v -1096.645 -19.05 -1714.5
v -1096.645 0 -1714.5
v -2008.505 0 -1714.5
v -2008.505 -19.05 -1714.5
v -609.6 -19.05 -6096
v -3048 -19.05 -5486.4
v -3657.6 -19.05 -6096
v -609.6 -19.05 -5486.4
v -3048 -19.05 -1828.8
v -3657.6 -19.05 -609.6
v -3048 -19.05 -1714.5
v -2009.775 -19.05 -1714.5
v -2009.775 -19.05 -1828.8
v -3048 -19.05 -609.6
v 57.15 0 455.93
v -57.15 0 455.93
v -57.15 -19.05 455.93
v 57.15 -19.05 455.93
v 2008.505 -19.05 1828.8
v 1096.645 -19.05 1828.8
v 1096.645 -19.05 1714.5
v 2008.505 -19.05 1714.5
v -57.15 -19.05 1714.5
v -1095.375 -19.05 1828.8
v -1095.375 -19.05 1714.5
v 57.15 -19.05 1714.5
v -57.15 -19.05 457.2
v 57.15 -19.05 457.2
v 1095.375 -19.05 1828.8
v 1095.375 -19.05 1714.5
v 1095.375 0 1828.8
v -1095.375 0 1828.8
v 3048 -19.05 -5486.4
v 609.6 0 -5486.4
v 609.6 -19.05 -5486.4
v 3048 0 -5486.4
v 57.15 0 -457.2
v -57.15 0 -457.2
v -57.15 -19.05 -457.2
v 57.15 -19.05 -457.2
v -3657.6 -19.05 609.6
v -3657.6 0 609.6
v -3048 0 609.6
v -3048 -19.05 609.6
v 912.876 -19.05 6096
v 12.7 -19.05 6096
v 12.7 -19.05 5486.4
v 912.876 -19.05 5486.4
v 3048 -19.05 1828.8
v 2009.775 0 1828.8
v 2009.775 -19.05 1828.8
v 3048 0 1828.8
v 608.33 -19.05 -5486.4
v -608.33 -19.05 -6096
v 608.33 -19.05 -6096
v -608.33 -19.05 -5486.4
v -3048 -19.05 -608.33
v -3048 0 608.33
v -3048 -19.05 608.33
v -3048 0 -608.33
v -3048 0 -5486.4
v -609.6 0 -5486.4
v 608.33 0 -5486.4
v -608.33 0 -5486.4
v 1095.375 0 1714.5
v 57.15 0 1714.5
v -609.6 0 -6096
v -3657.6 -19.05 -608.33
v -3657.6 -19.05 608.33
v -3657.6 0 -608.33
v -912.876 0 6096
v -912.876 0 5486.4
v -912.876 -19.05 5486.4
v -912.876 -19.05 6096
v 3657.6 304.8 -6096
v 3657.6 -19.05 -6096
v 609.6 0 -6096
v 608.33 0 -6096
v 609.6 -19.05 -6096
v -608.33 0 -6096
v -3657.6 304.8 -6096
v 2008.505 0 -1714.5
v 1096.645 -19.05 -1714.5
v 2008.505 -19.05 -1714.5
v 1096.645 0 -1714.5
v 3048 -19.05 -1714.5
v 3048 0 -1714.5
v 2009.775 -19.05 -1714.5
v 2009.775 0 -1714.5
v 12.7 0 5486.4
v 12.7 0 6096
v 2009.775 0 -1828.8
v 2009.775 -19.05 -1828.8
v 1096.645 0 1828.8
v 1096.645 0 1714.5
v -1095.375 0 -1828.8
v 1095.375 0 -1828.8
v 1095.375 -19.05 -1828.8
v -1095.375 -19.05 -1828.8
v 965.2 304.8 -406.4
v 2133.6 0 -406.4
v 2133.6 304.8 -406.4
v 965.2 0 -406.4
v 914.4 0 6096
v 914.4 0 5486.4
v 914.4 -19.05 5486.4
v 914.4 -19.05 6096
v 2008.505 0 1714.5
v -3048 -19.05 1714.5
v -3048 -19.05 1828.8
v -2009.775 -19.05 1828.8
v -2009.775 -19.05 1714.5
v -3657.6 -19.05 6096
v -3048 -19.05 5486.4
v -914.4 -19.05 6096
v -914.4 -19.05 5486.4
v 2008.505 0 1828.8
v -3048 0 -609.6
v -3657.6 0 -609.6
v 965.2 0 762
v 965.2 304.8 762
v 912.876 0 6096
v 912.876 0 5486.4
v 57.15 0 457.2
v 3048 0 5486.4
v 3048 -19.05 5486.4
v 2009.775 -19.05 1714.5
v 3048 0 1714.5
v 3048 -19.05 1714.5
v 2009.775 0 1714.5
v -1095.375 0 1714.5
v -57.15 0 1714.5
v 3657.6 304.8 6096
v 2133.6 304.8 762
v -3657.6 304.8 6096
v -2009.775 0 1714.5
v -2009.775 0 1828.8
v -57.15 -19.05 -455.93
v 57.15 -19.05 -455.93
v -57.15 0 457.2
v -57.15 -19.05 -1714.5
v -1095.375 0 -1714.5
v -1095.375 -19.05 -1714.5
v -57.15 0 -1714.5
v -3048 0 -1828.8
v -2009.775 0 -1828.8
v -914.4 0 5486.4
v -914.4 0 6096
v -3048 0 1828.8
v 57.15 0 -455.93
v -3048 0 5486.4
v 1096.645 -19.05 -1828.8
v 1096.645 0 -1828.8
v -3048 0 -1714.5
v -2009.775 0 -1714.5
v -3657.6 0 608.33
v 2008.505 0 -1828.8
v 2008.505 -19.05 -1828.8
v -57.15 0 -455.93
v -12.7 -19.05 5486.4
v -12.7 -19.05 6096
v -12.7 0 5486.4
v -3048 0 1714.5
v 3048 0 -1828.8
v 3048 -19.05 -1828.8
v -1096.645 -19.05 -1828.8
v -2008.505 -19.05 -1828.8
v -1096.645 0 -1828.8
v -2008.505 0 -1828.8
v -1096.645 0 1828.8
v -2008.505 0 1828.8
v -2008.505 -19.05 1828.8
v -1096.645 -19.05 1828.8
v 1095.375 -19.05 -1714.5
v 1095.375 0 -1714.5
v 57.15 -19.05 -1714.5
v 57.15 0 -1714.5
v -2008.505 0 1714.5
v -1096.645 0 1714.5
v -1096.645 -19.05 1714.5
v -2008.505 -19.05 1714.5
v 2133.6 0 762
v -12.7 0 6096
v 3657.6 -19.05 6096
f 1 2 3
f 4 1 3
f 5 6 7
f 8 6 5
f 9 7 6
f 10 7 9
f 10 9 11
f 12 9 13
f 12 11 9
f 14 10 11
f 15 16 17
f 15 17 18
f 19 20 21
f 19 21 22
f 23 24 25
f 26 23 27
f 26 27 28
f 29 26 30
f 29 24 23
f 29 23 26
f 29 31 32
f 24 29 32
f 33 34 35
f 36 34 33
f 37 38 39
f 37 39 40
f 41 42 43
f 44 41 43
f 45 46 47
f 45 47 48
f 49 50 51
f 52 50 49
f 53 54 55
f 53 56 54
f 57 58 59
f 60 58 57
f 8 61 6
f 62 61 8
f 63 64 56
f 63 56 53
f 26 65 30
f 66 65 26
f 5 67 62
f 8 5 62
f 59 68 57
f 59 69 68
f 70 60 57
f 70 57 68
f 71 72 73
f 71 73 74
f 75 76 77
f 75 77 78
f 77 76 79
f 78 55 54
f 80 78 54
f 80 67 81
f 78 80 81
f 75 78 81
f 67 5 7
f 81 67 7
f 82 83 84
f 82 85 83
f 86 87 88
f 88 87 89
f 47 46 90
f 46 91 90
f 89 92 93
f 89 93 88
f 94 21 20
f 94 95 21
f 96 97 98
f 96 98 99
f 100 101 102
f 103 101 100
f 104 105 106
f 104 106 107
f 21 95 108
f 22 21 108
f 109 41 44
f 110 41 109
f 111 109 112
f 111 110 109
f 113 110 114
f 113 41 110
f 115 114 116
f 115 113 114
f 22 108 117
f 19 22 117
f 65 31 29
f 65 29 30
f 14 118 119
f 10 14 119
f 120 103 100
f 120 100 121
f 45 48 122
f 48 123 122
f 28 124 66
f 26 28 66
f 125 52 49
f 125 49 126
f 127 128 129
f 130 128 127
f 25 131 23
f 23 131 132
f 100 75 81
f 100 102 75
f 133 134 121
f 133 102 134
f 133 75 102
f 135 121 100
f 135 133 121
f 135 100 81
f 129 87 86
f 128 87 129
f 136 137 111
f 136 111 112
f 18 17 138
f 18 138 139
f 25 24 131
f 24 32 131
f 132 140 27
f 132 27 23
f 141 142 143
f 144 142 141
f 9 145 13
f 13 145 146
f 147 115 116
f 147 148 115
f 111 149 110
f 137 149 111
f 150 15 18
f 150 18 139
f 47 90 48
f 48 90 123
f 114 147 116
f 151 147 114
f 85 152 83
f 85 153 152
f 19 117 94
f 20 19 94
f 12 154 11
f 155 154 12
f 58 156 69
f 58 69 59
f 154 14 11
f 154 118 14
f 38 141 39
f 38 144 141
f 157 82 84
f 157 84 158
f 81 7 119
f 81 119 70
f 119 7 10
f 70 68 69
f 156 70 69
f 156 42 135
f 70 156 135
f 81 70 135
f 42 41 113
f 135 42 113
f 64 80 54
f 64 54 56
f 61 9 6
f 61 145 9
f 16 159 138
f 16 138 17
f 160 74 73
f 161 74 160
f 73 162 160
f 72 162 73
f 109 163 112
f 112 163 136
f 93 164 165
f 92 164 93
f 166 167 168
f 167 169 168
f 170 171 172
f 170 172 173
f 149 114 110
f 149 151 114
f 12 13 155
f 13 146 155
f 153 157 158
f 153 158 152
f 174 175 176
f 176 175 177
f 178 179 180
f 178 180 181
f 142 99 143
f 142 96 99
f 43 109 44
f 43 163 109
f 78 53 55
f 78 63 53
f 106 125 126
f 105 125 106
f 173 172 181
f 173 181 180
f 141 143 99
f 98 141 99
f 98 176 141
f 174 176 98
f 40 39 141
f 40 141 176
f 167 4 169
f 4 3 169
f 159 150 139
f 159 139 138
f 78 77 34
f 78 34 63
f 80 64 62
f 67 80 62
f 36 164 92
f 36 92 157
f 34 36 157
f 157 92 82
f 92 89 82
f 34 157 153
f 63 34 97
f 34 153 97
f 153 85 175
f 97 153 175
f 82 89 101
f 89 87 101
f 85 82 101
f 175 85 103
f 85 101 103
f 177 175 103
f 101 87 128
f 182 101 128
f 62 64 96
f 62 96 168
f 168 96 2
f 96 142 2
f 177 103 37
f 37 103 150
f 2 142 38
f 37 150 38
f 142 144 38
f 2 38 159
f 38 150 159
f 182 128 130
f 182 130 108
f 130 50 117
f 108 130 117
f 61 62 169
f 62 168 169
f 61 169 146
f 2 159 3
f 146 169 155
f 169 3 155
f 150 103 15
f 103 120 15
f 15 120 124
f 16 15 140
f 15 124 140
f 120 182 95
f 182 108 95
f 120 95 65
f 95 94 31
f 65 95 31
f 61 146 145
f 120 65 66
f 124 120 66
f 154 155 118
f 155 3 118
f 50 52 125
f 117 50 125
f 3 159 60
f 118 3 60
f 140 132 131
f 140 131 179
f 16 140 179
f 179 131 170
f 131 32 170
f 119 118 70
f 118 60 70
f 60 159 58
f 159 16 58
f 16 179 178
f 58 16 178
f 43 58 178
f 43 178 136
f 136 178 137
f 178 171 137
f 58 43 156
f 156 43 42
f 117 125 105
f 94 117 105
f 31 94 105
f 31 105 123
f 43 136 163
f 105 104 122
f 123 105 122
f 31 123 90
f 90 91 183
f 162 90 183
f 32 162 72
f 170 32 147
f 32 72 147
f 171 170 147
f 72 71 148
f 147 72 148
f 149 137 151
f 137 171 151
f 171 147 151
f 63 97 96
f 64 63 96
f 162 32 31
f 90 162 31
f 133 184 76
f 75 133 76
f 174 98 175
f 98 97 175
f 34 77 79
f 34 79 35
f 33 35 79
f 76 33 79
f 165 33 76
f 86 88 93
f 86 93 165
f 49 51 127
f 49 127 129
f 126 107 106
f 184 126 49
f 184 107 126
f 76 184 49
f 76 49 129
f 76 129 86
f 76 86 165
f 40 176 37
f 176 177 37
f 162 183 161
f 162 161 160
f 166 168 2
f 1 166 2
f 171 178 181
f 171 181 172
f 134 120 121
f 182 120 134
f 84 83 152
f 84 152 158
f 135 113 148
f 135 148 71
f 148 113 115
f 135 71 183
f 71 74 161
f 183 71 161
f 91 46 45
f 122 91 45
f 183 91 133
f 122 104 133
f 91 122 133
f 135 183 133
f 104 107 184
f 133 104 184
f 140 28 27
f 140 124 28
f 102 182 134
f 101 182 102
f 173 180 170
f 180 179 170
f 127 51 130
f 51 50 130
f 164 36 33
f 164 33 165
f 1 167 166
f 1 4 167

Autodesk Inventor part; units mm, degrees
ref_plane "YZ Plane" through (0, 0, 0) normal (1, 0, 0) x (0, 1, 0)
ref_plane "XZ Plane" through (0, 0, 0) normal (0, 1, 0) x (-1, 0, 0)
ref_plane "XY Plane" through (0, 0, 0) normal (0, 0, 1) x (1, 0, 0)
sketch "Sketch1" plane through (0, 0, 0) normal (0, 1, 0) x (-1, 0, 0)
  line L0 (3657.6, -6096) -> (3657.6, 6096)
  line L1 (-3657.6, 6096) -> (-3657.6, -6096)
  line L2 (-3657.6, -6096) -> (-609.6, -6096)
  line L3 (609.6, -6096) -> (3657.6, -6096)
  line L4 (3657.6, 6096) -> (914.4, 6096)
  line L5 (-914.4, 6096) -> (-3657.6, 6096)
  line L6 (0, -8534.4) -> (0, 8534.4) projected
  line L7 (-5120.64, 0) -> (5120.64, 0) projected
  line L8 (-3657.6, -6096) -> (3657.6, -6096)
  line L9 (3657.6, -6096) -> (3657.6, 6096)
  line L10 (3657.6, 6096) -> (-3657.6, 6096)
  line L11 (-3657.6, 6096) -> (-3657.6, -6096)
  line L12 (-2133.6, -406.4) -> (-965.2, -406.4)
  line L13 (-965.2, -406.4) -> (-965.2, 762)
  line L14 (-965.2, 762) -> (-2133.6, 762)
  line L15 (-2133.6, 762) -> (-2133.6, -406.4)
  dimension "d0" = 7315.2
  dimension "d12" = 12192
  dimension "d16" = 1168.4
  dimension "d17" = 1168.4
  dimension "d18" = 1524
  dimension "d19" = 5689.6
extrude "Extrusion1" add sketch "Sketch1" along normal blind 304.8 contours L3 L8 L6 L7 L0 | L7 L6 L10 L4 L0 | L7 L13 L14 L15 L1 L5 L10 L6 | L6 L8 L2 L1 L7 L15 L12 L13
sketch "Sketch2" plane through (0, 0, 0) normal (0, -1, 0) x (1, 0, 0)
  line L0 (3657.6, -6096) -> (3657.6, 6096)
  line L1 (-3657.6, 6096) -> (-3657.6, -6096)
  line L2 (-3048, 1714.5) -> (-3048, -1714.5)
  line L3 (3048, -5486.4) -> (3048, -1828.8)
  line L4 (3048, -1714.5) -> (3048, 1714.5)
  line L5 (3048, 1828.8) -> (3048, 5486.4)
  line L6 (-3048, -1828.8) -> (-3048, -5486.4)
  line L7 (-3048, 5486.4) -> (-3048, 1828.8)
  line L8 (-3048, 1714.5) -> (-3048, -1714.5)
  line L9 (-2009.775, -1828.8) -> (-2009.775, -1714.5)
  line L10 (-1095.375, -1828.8) -> (-1095.375, -1714.5)
  line L11 (-3048, -1714.5) -> (-2009.775, -1714.5)
  line L12 (-1095.375, -1714.5) -> (-57.15, -1714.5)
  line L13 (-3048, -1828.8) -> (-2009.775, -1828.8)
  line L14 (3048, -1714.5) -> (2009.775, -1714.5)
  line L15 (3048, -1828.8) -> (2009.775, -1828.8)
  line L16 (2009.775, -1828.8) -> (2009.775, -1714.5)
  line L17 (1095.375, -1828.8) -> (1095.375, -1714.5)
  line L18 (1095.375, -1714.5) -> (57.15, -1714.5)
  line L19 (1095.375, -1828.8) -> (-1095.375, -1828.8)
  line L20 (-2009.775, -1828.8) -> (-3048, -1828.8)
  line L21 (-1095.375, -1828.8) -> (1095.375, -1828.8)
  line L22 (2009.775, -1828.8) -> (3048, -1828.8)
  line L23 (57.15, -1714.5) -> (1095.375, -1714.5)
  line L24 (2009.775, -1714.5) -> (3048, -1714.5)
  line L25 (2009.775, 1828.8) -> (3048, 1828.8)
  line L26 (3048, 1828.8) -> (2009.775, 1828.8)
  line L27 (3048, 1714.5) -> (2009.775, 1714.5)
  line L28 (2009.775, 1714.5) -> (3048, 1714.5)
  line L29 (1095.375, 1714.5) -> (57.15, 1714.5)
  line L30 (-1095.375, 1828.8) -> (-1095.375, 1714.5)
  line L31 (-3048, 1714.5) -> (-2009.775, 1714.5)
  line L32 (-1095.375, 1714.5) -> (-57.15, 1714.5)
  line L33 (-3048, 1828.8) -> (-2009.775, 1828.8)
  line L34 (2009.775, 1828.8) -> (2009.775, 1714.5)
  line L35 (1095.375, 1828.8) -> (1095.375, 1714.5)
  line L36 (1095.375, 1828.8) -> (-1095.375, 1828.8)
  line L37 (-2009.775, 1828.8) -> (-3048, 1828.8)
  line L38 (-1095.375, 1828.8) -> (1095.375, 1828.8)
  line L39 (57.15, 1714.5) -> (1095.375, 1714.5)
  line L40 (-2009.775, 1828.8) -> (-2009.775, 1714.5)
  line L41 (-57.15, -457.2) -> (57.15, -457.2)
  line L42 (57.15, 457.2) -> (-57.15, 457.2)
  line L43 (-609.6, -6096) -> (-609.6, -5486.4)
  line L44 (609.6, -6096) -> (609.6, -5486.4)
  line L45 (-3048, -5486.4) -> (-609.6, -5486.4)
  line L46 (609.6, -5486.4) -> (3048, -5486.4)
  line L47 (-3657.6, -6096) -> (-609.6, -6096)
  line L48 (609.6, -6096) -> (3657.6, -6096)
  line L49 (914.4, 5486.4) -> (914.4, 6096)
  line L50 (-914.4, 6096) -> (-914.4, 5486.4)
  line L51 (3048, 5486.4) -> (914.4, 5486.4)
  line L52 (-914.4, 5486.4) -> (-3048, 5486.4)
  line L53 (3657.6, 6096) -> (914.4, 6096)
  line L54 (-914.4, 6096) -> (-3657.6, 6096)
  line L55 (-57.15, -1714.5) -> (-57.15, -457.2)
  line L56 (-57.15, 457.2) -> (-57.15, 1714.5)
  line L57 (-57.15, 1714.5) -> (-57.15, 457.2)
  line L58 (-57.15, -457.2) -> (-57.15, -1714.5)
  line L59 (57.15, -1714.5) -> (57.15, -457.2)
  line L60 (57.15, 457.2) -> (57.15, 1714.5)
  line L61 (57.15, 1714.5) -> (57.15, 457.2)
  line L62 (57.15, -457.2) -> (57.15, -1714.5)
  line L63 (-3048, 5486.4) -> (-3048, 1828.8)
  line L64 (-3048, 1828.8) -> (-2009.775, 1828.8)
  line L65 (-2009.775, 1828.8) -> (-2009.775, 1714.5)
  line L66 (-2009.775, 1714.5) -> (-3048, 1714.5)
  line L67 (-3048, 1714.5) -> (-3048, -1714.5)
  line L68 (-3048, -1714.5) -> (-2009.775, -1714.5)
  line L69 (-2009.775, -1714.5) -> (-2009.775, -1828.8)
  line L70 (-2009.775, -1828.8) -> (-3048, -1828.8)
  line L71 (-3048, -1828.8) -> (-3048, -5486.4)
  line L72 (-3048, -5486.4) -> (-609.6, -5486.4)
  line L73 (609.6, -5486.4) -> (3048, -5486.4)
  line L74 (3048, -5486.4) -> (3048, -1828.8)
  line L75 (3048, -1828.8) -> (2009.775, -1828.8)
  line L76 (2009.775, -1828.8) -> (2009.775, -1714.5)
  line L77 (2009.775, -1714.5) -> (3048, -1714.5)
  line L78 (3048, 1714.5) -> (3048, -1714.5)
  line L79 (3048, 1714.5) -> (2009.775, 1714.5)
  line L80 (2009.775, 1714.5) -> (2009.775, 1828.8)
  line L81 (2009.775, 1828.8) -> (3048, 1828.8)
  line L82 (3048, 1828.8) -> (3048, 5486.4)
  line L83 (3657.6, 6096) -> (-3657.6, 6096) projected
  line L84 (0, 8534.4) -> (0, -8534.4) projected
  line L85 (-12.7, 6096) -> (12.7, 6096)
  line L86 (3657.6, -6096) -> (3657.6, 6096) projected
  line L87 (-2009.775, 1828.8) -> (-2008.505, 1828.8)
  line L88 (-1095.375, 1828.8) -> (-1096.645, 1828.8)
  line L89 (-1095.375, 1714.5) -> (-1096.645, 1714.5)
  line L90 (-1096.645, 1714.5) -> (-1096.645, 1828.8)
  line L91 (-2009.775, 1714.5) -> (-2008.505, 1714.5)
  line L92 (-2008.505, 1714.5) -> (-2008.505, 1828.8)
  line L93 (-2008.505, 1828.8) -> (-1096.645, 1828.8)
  line L94 (-1096.645, 1828.8) -> (-1096.645, 1714.5)
  line L95 (-1096.645, 1714.5) -> (-2008.505, 1714.5)
  line L96 (-2008.505, 1714.5) -> (-2008.505, 1828.8)
  line L97 (-5120.64, 0) -> (5120.64, 0) projected
  line L98 (-2009.775, -1828.8) -> (-2008.505, -1828.8)
  line L99 (-1095.375, -1828.8) -> (-1096.645, -1828.8)
  line L100 (-1095.375, -1714.5) -> (-1096.645, -1714.5)
  line L101 (-2009.775, -1714.5) -> (-2008.505, -1714.5)
  line L102 (-2008.505, -1714.5) -> (-2008.505, -1828.8)
  line L103 (-2008.505, -1828.8) -> (-1096.645, -1828.8)
  line L104 (-1096.645, -1828.8) -> (-1096.645, -1714.5)
  line L105 (-1096.645, -1714.5) -> (-2008.505, -1714.5)
  line L106 (2009.775, 1828.8) -> (2008.505, 1828.8)
  line L107 (1095.375, 1828.8) -> (1096.645, 1828.8)
  line L108 (1095.375, 1714.5) -> (1096.645, 1714.5)
  line L109 (1096.645, 1714.5) -> (1096.645, 1828.8)
  line L110 (2009.775, 1714.5) -> (2008.505, 1714.5)
  line L111 (2008.505, 1714.5) -> (2008.505, 1828.8)
  line L112 (2008.505, 1828.8) -> (1096.645, 1828.8)
  line L113 (1096.645, 1714.5) -> (2008.505, 1714.5)
  line L114 (2009.775, -1714.5) -> (2008.505, -1714.5)
  line L115 (2008.505, -1714.5) -> (2008.505, -1828.8)
  line L116 (2009.775, -1828.8) -> (2008.505, -1828.8)
  line L117 (2008.505, -1828.8) -> (1096.645, -1828.8)
  line L118 (1096.645, -1714.5) -> (2008.505, -1714.5)
  line L119 (1095.375, -1714.5) -> (1096.645, -1714.5)
  line L120 (1096.645, -1828.8) -> (1096.645, -1714.5)
  line L121 (1095.375, -1828.8) -> (1096.645, -1828.8)
  line L122 (-3657.6, 6096) -> (-3657.6, -6096) projected
  line L123 (-3657.6, -6096) -> (3657.6, -6096) projected
  line L124 (-2008.505, -1828.8) -> (-1096.645, -1828.8)
  line L125 (-1096.645, -1828.8) -> (-1096.645, -1714.5)
  line L126 (-1096.645, -1714.5) -> (-2008.505, -1714.5)
  line L127 (-2008.505, -1714.5) -> (-2008.505, -1828.8)
  line L128 (1096.645, -1714.5) -> (2008.505, -1714.5)
  line L129 (2008.505, -1714.5) -> (2008.505, -1828.8)
  line L130 (2008.505, -1828.8) -> (1096.645, -1828.8)
  line L131 (1096.645, -1828.8) -> (1096.645, -1714.5)
  line L132 (1096.645, 1828.8) -> (2008.505, 1828.8)
  line L133 (2008.505, 1828.8) -> (2008.505, 1714.5)
  line L134 (2008.505, 1714.5) -> (1096.645, 1714.5)
  line L135 (1096.645, 1714.5) -> (1096.645, 1828.8)
  line L136 (-912.876, 6096) -> (-12.7, 6096)
  line L137 (-12.7, 6096) -> (-12.7, 5486.4)
  line L138 (-12.7, 5486.4) -> (-912.876, 5486.4)
  line L139 (-912.876, 5486.4) -> (-912.876, 6096)
  line L140 (12.7, 6096) -> (12.7, 5486.4)
  line L141 (12.7, 5486.4) -> (912.876, 5486.4)
  line L142 (912.876, 5486.4) -> (912.876, 6096)
  line L143 (-912.876, 5486.4) -> (-12.7, 5486.4)
  line L144 (-12.7, 5486.4) -> (-12.7, 6096)
  line L145 (-12.7, 6096) -> (-912.876, 6096)
  line L146 (-912.876, 6096) -> (-912.876, 5486.4)
  line L147 (12.7, 6096) -> (912.876, 6096)
  line L148 (912.876, 6096) -> (912.876, 5486.4)
  line L149 (912.876, 5486.4) -> (12.7, 5486.4)
  line L150 (12.7, 5486.4) -> (12.7, 6096)
  line L151 (-608.33, -5486.4) -> (608.33, -5486.4)
  line L152 (608.33, -5486.4) -> (608.33, -6096)
  line L153 (608.33, -6096) -> (-608.33, -6096)
  line L154 (-608.33, -6096) -> (-608.33, -5486.4)
  line L155 (-3657.6, 609.6) -> (-3048, 609.6)
  line L156 (-3048, 609.6) -> (-3048, -609.6)
  line L157 (-3048, -609.6) -> (-3657.6, -609.6)
  line L158 (-3657.6, -609.6) -> (-3657.6, 609.6)
  line L159 (-57.15, 455.93) -> (57.15, 455.93)
  line L160 (57.15, 455.93) -> (57.15, -455.93)
  line L161 (57.15, -455.93) -> (-57.15, -455.93)
  line L162 (-57.15, -455.93) -> (-57.15, 455.93)
  line L163 (-3657.6, 608.33) -> (-3048, 608.33)
  line L164 (-3048, 608.33) -> (-3048, -608.33)
  line L165 (-3048, -608.33) -> (-3657.6, -608.33)
  line L166 (-3657.6, -608.33) -> (-3657.6, 608.33)
  point P0 (0, 0)
  point P1 (0, 0)
  point P2 (0, 5486.4)
  dimension "d22" = 7315.2
  dimension "d23" = 609.6
  dimension "d24" = 1038.225
  dimension "d25" = 914.4
  dimension "d26" = 114.3
  dimension "d27" = 1038.225
  dimension "d28" = 1038.225
  dimension "d29" = 914.4
  dimension "d30" = 1219.2
  dimension "d31" = 609.6
  dimension "d32" = 4267.2
  dimension "d33" = 1828.8
  dimension "d34" = 12192
  dimension "d35" = 609.6
  dimension "d36" = 114.3
  dimension "d40" = 1.27
  dimension "d41" = 1.27
  dimension "d42" = 1.524
  dimension "d43" = 12.7
  dimension "d44" = 1.27
  dimension "d45" = 1219.2
  dimension "d48" = 1.27
  dimension "d51" = 1.27
extrude "Extrusion3" add sketch "Sketch2" along normal blind 19.05 contours L48 L44 L46 L3 L15 L16 L14 L4 L97 L0 | L97 L4 L27 L34 L25 L5 L51 L49 L53 L0 | L123 L84 L151 L152 | L123 L154 L151 L84 | L142 L141 L140 L83 | L115 L117 L120 L118 | L113 L109 L112 L111 | L84 L41 L59 L18 L17 L19 | L19 L10 L12 L55 L41 L84 | L47 L1 L157 L2 L11 L9 L13 L6 L45 L43 | L84 L36 L35 L29 L60 L42 | L42 L56 L32 L30 L36 L84 | L97 L1 L163 L2 | L2 L165 L1 L97 | L137 L138 L139 L83 | L103 L102 L105 L104 | L155 L1 L54 L50 L52 L7 L33 L40 L31 L2 | L90 L95 L92 L93
extrude "Extrusion4" add sketch "Sketch2" along normal blind 19.05 contours L160 L161 L84 L97 | L97 L84 L159 L160 | L97 L162 L159 L84 | L84 L161 L162 L97
properties part number "East_Structure_Roof"
